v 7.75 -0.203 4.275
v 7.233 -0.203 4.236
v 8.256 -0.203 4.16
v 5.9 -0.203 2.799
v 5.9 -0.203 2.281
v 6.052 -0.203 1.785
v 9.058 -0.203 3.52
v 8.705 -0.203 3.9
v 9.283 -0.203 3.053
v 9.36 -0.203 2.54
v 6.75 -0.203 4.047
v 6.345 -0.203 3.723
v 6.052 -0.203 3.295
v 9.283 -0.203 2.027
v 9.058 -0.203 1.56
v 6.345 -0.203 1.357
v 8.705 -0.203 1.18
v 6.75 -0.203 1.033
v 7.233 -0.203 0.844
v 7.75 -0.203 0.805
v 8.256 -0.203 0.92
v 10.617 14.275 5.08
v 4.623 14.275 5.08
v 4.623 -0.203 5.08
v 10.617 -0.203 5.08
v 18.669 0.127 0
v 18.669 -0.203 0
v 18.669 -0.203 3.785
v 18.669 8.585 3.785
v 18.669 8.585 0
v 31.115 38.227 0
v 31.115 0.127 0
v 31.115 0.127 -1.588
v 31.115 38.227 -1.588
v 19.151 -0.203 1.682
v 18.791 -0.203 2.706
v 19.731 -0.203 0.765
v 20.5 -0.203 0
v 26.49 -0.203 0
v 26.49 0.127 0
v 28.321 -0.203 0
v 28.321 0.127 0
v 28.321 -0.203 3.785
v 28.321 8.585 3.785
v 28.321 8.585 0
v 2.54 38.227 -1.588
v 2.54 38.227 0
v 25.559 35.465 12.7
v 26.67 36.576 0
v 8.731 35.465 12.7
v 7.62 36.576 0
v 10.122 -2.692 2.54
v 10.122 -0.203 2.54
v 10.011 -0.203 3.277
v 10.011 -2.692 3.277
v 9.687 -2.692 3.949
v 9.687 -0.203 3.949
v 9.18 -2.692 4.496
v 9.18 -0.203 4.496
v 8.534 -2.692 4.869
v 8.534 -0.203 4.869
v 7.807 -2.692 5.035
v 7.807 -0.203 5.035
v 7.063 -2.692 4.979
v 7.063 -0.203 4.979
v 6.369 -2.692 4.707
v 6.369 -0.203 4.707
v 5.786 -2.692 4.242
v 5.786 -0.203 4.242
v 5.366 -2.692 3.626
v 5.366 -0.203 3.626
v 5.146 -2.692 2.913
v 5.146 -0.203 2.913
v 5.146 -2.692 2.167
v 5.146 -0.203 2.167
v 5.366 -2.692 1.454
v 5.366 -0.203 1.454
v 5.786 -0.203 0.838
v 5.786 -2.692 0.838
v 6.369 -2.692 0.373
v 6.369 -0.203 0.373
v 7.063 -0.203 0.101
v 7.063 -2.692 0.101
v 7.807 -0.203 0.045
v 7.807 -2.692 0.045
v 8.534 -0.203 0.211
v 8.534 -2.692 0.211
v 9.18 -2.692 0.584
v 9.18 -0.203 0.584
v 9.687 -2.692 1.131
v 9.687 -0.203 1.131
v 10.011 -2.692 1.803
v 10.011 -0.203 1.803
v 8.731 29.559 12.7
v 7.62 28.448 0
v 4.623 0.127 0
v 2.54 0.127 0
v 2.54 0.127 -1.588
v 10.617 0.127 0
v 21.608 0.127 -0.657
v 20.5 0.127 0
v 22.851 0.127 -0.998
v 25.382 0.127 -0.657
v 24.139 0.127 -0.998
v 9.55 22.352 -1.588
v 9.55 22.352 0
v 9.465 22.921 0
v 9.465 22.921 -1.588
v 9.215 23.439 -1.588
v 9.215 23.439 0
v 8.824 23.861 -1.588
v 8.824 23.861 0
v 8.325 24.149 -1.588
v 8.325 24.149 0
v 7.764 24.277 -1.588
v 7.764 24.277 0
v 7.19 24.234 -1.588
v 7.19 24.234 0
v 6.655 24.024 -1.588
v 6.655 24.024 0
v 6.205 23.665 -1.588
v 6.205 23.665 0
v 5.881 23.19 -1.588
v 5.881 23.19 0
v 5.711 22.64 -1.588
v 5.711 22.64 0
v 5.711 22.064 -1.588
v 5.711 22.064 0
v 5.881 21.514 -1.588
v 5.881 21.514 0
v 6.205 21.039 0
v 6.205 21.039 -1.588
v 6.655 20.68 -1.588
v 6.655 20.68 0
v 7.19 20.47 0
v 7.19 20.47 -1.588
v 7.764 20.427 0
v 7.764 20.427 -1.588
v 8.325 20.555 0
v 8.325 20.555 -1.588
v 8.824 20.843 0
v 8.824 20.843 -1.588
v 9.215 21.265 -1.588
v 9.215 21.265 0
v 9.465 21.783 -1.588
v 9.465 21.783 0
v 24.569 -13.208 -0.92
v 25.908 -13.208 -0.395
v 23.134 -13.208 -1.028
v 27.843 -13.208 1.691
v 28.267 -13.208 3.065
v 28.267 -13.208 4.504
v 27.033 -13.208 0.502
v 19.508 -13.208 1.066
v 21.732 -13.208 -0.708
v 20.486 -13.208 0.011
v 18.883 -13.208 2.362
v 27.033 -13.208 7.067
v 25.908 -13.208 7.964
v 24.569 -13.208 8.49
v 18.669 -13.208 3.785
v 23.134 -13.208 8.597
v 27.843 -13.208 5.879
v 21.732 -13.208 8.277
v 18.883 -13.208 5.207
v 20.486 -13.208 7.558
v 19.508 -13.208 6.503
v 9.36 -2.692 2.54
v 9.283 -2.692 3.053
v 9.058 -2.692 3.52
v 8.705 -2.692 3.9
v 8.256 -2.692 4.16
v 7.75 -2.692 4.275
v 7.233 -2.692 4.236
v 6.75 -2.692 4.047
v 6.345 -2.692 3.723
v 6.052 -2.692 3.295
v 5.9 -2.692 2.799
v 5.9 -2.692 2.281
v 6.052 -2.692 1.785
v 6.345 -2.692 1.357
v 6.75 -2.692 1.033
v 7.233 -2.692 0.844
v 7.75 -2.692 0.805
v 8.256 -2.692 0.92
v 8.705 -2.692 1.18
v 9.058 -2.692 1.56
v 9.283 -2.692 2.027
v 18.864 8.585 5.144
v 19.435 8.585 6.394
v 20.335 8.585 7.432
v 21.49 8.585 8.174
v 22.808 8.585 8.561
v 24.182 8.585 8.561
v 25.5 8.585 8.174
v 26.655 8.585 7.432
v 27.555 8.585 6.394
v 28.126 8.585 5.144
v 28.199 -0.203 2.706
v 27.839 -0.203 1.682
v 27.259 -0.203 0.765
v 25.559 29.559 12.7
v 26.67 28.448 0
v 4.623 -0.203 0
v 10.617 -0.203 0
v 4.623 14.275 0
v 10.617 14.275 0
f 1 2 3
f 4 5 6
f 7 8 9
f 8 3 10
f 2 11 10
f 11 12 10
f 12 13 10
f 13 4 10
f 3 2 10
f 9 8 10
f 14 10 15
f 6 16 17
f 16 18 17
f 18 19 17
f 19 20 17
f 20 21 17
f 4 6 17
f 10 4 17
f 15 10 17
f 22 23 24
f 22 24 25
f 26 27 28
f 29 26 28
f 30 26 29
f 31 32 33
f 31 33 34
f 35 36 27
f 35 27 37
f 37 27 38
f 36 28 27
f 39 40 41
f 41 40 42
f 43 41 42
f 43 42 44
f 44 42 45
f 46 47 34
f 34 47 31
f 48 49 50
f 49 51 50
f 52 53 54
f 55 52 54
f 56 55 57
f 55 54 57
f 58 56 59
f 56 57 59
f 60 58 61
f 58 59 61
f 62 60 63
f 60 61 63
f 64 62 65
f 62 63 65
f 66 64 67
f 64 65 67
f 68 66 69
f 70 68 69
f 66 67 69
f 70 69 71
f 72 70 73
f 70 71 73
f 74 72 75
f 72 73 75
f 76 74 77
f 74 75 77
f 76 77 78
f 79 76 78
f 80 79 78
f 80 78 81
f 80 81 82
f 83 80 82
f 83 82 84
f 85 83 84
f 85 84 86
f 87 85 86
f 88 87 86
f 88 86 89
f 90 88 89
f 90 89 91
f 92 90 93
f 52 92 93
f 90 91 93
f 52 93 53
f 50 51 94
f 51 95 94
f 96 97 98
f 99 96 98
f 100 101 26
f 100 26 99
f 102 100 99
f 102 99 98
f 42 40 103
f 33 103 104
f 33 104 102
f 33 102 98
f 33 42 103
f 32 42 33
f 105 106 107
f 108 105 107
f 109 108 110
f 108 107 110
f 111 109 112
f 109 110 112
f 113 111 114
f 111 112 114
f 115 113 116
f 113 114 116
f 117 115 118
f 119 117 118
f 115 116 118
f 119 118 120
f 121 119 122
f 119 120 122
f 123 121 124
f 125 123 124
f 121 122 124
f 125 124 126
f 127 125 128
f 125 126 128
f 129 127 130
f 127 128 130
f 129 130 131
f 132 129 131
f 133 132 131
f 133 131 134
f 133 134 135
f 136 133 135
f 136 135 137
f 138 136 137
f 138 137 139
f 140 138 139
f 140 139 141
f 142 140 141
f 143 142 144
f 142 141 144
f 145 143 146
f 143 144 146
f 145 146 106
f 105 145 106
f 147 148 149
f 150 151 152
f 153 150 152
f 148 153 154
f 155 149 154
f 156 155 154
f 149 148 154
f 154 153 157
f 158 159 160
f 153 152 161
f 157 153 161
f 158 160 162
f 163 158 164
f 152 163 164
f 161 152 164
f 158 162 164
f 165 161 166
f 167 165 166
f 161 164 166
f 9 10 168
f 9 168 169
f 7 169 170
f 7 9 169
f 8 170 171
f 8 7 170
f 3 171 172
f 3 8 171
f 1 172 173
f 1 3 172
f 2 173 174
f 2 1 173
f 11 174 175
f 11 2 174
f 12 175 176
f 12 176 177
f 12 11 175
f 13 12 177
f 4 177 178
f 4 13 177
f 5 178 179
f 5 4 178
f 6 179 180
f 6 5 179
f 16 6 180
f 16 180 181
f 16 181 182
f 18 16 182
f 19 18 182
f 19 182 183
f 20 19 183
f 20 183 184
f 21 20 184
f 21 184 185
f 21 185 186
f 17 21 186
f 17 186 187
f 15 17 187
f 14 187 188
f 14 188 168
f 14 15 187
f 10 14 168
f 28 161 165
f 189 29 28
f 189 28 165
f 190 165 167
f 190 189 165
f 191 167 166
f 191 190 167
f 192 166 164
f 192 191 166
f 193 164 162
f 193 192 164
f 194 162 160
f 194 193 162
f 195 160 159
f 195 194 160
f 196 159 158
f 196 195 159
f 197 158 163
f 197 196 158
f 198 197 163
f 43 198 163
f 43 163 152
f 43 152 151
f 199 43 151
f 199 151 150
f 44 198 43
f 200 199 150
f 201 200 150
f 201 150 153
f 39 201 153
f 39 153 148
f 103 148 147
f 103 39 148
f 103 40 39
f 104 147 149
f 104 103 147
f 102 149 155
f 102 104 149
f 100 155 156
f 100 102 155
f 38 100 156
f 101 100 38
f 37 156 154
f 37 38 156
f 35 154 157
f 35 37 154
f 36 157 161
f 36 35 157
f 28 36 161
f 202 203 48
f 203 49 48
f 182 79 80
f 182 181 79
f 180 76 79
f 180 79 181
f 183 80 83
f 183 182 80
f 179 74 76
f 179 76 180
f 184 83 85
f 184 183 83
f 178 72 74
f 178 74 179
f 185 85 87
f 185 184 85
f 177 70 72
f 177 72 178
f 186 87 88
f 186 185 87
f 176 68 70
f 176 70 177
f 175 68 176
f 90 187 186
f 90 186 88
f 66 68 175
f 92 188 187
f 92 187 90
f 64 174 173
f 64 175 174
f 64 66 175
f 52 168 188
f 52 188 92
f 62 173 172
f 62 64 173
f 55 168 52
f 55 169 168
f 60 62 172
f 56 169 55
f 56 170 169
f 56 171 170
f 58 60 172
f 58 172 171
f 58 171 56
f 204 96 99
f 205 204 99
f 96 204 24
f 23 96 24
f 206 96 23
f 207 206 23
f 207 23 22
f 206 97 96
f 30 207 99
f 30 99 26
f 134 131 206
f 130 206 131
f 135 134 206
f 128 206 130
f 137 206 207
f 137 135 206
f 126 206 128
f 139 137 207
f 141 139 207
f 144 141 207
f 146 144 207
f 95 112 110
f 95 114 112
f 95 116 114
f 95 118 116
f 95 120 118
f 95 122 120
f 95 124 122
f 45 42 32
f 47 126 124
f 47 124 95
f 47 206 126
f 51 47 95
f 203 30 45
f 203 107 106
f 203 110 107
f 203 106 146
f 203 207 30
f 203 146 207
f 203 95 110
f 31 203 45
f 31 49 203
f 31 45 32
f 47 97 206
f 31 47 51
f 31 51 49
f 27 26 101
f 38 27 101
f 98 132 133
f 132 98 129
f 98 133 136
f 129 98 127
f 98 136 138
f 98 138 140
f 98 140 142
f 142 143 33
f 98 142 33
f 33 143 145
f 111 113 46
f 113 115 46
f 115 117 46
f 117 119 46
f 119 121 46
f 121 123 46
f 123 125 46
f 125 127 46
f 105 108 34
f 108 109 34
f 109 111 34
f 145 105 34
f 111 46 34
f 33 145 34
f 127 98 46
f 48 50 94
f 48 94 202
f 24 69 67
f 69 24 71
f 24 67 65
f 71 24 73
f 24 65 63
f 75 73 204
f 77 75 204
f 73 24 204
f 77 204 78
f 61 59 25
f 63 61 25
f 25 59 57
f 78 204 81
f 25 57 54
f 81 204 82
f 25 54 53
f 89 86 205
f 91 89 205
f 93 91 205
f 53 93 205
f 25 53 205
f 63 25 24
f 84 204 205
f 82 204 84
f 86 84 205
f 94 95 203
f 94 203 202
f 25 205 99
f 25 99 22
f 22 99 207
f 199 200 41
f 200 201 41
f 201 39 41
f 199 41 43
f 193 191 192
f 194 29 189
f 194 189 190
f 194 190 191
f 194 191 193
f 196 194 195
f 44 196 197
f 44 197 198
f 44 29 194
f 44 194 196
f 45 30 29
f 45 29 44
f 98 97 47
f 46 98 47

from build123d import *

# Parameters (mm, degrees)
SKETCH_W      = 28.575
SKETCH_H      = 38.1
SKETCH_R      = 1.9304
PAD_DEPTH     = 1.5875
SKETCH001_W   = 19.05
SKETCH001_H   = 8.128
PAD001_DEPTH  = 12.7
PAD001_TAPER  = 5
SKETCH002_W   = 5.9944
SKETCH002_H   = 14.478
PAD002_DEPTH  = 5.08
SKETCH003_R   = 2.5019
SKETCH003_R_2 = 1.7399
PAD003_DEPTH  = 2.4892
SKETCH004_W   = 9.652
SKETCH004_H   = 8.7884
PAD004_DEPTH  = 3.7846
SKETCH005_R   = 4.826
PAD005_DEPTH  = 21.7932


with BuildPart() as part:
    # Sketch → Pad (new body)
    with BuildSketch(Plane.XY):
        with Locations((15.5575, 19.05)):
            Rectangle(SKETCH_W, SKETCH_H)
        with Locations((6.35, 22.225)):
            Circle(SKETCH_R, mode=Mode.SUBTRACT)
    extrude(amount=-PAD_DEPTH)

    # Sketch001 (on Face6 of Pad) → Pad001 (join)
    with BuildSketch(Plane.XY):
        with Locations((15.875, 32.385)):
            Rectangle(SKETCH001_W, SKETCH001_H)
    extrude(amount=PAD001_DEPTH, taper=PAD001_TAPER)

    # Sketch002 (on Face4 of Pad001) → Pad002 (join)
    with BuildSketch(Plane.XY):
        with Locations((6.35, 6.9088)):
            Rectangle(SKETCH002_W, SKETCH002_H)
    extrude(amount=PAD002_DEPTH)

    # Sketch003 (on Face16 of Pad002) → Pad003 (join)
    with BuildSketch(Plane.XZ.offset(0.3302)):
        with Locations((6.35, 2.54)):
            Circle(SKETCH003_R)
        with Locations((6.35, 2.54)):
            Circle(SKETCH003_R_2, mode=Mode.SUBTRACT)
    extrude(amount=PAD003_DEPTH)

    # Sketch004 (on Face4 of Pad003) → Pad004 (join)
    with BuildSketch(Plane.XY):
        with Locations((22.225, 4.064)):
            Rectangle(SKETCH004_W, SKETCH004_H)
    extrude(amount=PAD004_DEPTH)

    # Sketch005 (on Face10 of Pad004) → Pad005 (join)
    with BuildSketch(Plane(origin=(0, 8.4582, 0), x_dir=(-1, 0, 0), z_dir=(0, 1, 0))):
        with Locations((-22.225, 3.7846)):
            Circle(SKETCH005_R)
    extrude(amount=-PAD005_DEPTH)


with BuildPart() as part_1:
    # Body002 placement: moved
    add(part.part.moved(Location((1.27, 0.127, 0))))


solid = part_1.part
